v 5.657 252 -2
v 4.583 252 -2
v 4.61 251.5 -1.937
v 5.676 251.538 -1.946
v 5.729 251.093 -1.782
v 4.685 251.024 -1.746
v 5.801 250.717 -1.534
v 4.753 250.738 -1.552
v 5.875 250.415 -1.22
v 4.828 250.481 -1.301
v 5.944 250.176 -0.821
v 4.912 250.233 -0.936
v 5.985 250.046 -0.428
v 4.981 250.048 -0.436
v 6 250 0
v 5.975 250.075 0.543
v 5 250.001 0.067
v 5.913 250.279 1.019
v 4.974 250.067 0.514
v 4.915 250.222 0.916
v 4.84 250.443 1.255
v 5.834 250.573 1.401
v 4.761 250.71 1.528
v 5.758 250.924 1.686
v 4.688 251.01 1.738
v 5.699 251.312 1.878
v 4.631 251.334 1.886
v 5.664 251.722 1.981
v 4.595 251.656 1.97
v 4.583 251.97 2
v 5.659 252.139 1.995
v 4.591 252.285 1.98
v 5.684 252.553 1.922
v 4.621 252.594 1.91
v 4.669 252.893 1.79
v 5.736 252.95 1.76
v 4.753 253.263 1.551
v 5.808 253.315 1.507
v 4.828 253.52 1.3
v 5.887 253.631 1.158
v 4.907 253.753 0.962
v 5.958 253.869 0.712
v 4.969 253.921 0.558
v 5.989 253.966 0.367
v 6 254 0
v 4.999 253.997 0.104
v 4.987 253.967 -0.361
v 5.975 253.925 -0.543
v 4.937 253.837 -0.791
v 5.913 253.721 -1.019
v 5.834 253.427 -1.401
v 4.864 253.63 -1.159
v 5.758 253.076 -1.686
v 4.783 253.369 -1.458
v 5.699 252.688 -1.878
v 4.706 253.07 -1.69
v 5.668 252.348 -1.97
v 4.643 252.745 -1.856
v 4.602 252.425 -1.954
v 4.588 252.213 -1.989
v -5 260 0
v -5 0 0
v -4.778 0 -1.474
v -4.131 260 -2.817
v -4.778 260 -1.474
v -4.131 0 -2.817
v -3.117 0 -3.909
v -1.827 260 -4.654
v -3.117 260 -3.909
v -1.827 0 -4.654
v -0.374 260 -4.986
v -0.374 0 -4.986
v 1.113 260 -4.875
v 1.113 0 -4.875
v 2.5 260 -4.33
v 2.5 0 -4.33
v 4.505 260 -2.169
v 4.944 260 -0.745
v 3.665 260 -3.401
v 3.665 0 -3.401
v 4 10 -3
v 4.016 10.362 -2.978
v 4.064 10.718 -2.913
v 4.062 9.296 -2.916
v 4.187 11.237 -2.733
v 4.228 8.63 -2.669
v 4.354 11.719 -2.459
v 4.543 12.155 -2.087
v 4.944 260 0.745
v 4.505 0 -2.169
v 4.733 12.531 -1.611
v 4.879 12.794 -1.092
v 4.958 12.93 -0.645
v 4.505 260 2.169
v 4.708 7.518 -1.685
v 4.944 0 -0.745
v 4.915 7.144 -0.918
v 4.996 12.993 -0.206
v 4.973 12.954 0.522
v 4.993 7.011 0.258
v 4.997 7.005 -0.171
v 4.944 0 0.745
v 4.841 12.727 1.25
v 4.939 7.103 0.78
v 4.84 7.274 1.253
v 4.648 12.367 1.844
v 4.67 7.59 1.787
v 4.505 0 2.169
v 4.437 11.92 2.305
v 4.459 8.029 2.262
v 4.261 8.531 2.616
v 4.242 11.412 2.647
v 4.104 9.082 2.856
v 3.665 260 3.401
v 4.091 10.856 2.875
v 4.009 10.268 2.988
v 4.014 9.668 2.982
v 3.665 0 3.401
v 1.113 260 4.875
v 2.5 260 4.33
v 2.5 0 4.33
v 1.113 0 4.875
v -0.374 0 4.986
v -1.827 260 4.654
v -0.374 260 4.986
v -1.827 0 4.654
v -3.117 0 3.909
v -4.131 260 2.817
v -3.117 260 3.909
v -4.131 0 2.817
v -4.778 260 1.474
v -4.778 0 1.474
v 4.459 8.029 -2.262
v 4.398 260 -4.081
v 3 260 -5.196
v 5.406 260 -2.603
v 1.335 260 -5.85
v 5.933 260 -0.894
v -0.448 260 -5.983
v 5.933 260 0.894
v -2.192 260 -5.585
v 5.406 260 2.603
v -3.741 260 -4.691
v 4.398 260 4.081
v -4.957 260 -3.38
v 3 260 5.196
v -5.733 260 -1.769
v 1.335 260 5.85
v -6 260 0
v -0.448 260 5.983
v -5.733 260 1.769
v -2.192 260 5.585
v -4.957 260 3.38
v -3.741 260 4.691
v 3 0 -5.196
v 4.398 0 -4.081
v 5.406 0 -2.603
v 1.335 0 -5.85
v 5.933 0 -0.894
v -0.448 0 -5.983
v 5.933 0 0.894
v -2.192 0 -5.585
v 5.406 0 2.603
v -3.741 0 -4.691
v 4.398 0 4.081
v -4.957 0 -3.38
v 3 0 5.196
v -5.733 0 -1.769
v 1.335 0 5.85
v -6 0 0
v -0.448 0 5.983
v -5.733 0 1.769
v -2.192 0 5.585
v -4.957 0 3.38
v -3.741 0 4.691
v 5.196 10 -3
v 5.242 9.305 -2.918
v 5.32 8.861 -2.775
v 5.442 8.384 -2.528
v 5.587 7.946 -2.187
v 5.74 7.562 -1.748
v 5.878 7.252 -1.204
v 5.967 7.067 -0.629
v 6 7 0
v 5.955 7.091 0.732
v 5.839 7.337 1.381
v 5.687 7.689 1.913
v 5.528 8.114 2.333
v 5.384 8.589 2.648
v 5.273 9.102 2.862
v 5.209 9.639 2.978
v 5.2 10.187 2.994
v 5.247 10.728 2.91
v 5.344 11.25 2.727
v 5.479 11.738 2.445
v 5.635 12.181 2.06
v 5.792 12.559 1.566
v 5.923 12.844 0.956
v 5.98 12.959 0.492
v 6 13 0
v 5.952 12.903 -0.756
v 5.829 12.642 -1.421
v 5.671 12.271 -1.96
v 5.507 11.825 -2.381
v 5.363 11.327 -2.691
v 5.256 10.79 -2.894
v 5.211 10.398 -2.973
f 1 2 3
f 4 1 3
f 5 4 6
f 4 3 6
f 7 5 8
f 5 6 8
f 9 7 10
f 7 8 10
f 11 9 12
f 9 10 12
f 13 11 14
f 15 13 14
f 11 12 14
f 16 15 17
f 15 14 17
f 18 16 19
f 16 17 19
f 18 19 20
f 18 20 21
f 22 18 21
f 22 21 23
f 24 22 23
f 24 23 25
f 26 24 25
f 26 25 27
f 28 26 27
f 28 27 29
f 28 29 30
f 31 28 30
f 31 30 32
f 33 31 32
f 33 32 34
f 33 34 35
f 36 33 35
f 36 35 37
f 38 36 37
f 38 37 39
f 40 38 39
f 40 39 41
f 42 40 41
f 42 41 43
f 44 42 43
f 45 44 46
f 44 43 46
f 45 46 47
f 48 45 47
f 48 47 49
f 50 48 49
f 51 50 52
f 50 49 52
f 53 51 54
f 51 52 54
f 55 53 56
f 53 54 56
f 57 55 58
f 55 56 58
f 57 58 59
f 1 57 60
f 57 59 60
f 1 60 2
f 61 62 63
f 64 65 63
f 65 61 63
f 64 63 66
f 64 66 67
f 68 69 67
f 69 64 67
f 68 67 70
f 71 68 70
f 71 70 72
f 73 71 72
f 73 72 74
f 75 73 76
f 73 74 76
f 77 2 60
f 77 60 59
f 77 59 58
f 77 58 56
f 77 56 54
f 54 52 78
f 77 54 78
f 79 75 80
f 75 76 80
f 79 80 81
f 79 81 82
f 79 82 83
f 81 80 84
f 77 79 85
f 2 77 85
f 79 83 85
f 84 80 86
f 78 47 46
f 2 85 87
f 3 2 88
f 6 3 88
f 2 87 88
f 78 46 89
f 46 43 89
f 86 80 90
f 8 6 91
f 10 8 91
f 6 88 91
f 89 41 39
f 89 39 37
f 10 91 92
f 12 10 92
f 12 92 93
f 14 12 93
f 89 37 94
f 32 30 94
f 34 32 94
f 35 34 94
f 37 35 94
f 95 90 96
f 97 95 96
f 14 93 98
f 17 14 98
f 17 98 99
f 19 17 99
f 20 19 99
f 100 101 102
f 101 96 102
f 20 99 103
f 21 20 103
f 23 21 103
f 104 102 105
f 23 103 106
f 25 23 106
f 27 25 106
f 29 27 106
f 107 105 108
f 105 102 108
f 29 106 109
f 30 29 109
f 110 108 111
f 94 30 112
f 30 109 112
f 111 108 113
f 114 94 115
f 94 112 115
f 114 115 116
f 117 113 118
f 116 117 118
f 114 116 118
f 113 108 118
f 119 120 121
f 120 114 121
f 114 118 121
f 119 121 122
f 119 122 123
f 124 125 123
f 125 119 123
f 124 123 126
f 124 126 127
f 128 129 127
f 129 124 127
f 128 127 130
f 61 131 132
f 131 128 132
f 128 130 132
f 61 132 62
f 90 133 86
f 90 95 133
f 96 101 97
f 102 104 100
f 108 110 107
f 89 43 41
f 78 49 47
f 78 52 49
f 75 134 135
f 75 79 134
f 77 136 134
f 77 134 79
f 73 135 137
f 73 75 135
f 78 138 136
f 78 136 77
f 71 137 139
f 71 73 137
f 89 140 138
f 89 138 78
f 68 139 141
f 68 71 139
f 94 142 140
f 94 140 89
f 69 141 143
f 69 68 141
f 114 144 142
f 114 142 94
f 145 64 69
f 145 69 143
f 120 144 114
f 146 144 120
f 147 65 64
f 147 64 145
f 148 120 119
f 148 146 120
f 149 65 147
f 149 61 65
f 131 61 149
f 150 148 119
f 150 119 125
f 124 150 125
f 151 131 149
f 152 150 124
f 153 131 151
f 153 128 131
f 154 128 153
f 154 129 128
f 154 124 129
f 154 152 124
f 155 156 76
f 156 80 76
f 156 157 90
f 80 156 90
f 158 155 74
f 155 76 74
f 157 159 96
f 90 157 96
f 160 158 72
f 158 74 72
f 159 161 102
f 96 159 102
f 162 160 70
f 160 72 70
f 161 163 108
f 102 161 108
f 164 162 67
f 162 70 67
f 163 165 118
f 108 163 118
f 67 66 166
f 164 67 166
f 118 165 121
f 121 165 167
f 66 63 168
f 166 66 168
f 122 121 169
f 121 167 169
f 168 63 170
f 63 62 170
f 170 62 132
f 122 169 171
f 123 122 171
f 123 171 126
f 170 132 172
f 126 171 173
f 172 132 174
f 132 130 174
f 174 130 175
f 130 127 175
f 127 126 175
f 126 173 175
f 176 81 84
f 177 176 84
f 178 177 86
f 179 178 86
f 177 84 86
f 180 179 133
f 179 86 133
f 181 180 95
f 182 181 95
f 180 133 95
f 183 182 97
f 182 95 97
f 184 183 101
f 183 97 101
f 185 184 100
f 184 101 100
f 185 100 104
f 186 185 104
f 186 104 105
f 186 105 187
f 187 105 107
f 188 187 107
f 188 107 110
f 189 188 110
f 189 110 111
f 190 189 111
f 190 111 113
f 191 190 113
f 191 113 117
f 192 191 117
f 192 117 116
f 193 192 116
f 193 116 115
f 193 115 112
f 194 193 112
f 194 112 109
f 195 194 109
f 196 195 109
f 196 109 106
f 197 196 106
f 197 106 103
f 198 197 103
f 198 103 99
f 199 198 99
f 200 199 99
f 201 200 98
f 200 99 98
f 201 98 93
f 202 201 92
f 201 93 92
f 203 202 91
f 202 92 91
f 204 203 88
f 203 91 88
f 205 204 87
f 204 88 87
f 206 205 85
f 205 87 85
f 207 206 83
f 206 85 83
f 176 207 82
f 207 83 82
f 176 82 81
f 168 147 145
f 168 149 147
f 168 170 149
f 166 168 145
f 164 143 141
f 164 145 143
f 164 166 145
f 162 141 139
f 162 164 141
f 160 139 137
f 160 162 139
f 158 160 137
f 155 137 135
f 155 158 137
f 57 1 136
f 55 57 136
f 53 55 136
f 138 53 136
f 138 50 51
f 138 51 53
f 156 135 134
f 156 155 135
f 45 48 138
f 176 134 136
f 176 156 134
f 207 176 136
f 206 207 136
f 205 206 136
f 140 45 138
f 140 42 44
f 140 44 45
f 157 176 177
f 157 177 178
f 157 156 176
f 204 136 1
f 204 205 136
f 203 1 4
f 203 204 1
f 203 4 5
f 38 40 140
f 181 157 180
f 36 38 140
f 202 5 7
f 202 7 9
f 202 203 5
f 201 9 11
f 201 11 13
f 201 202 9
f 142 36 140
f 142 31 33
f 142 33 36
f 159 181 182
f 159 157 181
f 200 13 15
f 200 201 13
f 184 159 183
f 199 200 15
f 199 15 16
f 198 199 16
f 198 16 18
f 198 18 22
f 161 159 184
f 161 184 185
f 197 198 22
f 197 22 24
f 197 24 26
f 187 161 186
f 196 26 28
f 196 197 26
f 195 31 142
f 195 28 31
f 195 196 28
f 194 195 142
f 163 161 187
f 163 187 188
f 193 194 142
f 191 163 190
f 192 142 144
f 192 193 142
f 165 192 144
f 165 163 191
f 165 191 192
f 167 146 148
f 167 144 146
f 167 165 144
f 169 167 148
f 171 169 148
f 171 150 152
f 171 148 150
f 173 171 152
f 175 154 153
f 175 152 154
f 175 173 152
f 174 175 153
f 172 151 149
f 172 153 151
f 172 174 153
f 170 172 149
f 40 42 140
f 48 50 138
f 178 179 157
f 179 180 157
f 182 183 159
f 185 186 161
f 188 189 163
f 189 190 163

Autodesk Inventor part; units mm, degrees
ref_plane "XZ Plane" through (0, 0, 0) normal (0, 1, 0) x (-1, 0, 0)
ref_plane "XY Plane" through (0, 0, 0) normal (0, 0, 1) x (1, 0, 0)
sketch "Sketch1" plane through (0, 0, 0) normal (0, 1, 0) x (-1, 0, 0)
  circle A0 centre (0, 0) radius 5
  circle A1 centre (0, 0) radius 6
  dimension "d0" = 12
  dimension "d1" = 1
extrude "Extrusion1" add sketch "Sketch1" along normal blind 260
ref_plane "Work Plane3" through (6, 0, 0) normal (1, 0, 0) x (0, 1, 0)
sketch "Sketch2" plane through (6, 0, 0) normal (1, 0, 0) x (0, 1, 0)
  line L0 (0, -6) -> (260, -6) projected
  line L1 (0, 6) -> (260, 6) projected
  line L2 (260, -6) -> (260, 6) projected
  line L3 (-60, 0) -> (360, 0) projected
  point P0 (0, 0)
  point P1 (10, 0)
  point P2 (252, 0)
  point P3 (260, 0)
  dimension "d20" = 10
  dimension "d21" = 8
hole "Hole1" at (6, 10, 0) direction (-1, 0, 0) diameter 6 end up to surface
hole "Hole2" at (6, 252, 0) direction (-1, 0, 0) diameter 4 end up to surface
equation "\"d2\" = pipe_length"
equation "\"pipe_length\" = -hinge_arm_length + hinge_insertion - 0.5 * box_diameter + 0.5 * stand_diameter - connection_length - margin_for_connection"
equation "\"stand_diameter\" = 800"
equation "\"hinge_insertion\" = 15"
equation "\"connection_length\" = 20"
equation "\"box_diameter\" = 200"
equation "\"hinge_arm_length\" = 25"
equation "\"margin_for_connection\" = 10"
properties part number "pipe" material "Aluminum 6061"
